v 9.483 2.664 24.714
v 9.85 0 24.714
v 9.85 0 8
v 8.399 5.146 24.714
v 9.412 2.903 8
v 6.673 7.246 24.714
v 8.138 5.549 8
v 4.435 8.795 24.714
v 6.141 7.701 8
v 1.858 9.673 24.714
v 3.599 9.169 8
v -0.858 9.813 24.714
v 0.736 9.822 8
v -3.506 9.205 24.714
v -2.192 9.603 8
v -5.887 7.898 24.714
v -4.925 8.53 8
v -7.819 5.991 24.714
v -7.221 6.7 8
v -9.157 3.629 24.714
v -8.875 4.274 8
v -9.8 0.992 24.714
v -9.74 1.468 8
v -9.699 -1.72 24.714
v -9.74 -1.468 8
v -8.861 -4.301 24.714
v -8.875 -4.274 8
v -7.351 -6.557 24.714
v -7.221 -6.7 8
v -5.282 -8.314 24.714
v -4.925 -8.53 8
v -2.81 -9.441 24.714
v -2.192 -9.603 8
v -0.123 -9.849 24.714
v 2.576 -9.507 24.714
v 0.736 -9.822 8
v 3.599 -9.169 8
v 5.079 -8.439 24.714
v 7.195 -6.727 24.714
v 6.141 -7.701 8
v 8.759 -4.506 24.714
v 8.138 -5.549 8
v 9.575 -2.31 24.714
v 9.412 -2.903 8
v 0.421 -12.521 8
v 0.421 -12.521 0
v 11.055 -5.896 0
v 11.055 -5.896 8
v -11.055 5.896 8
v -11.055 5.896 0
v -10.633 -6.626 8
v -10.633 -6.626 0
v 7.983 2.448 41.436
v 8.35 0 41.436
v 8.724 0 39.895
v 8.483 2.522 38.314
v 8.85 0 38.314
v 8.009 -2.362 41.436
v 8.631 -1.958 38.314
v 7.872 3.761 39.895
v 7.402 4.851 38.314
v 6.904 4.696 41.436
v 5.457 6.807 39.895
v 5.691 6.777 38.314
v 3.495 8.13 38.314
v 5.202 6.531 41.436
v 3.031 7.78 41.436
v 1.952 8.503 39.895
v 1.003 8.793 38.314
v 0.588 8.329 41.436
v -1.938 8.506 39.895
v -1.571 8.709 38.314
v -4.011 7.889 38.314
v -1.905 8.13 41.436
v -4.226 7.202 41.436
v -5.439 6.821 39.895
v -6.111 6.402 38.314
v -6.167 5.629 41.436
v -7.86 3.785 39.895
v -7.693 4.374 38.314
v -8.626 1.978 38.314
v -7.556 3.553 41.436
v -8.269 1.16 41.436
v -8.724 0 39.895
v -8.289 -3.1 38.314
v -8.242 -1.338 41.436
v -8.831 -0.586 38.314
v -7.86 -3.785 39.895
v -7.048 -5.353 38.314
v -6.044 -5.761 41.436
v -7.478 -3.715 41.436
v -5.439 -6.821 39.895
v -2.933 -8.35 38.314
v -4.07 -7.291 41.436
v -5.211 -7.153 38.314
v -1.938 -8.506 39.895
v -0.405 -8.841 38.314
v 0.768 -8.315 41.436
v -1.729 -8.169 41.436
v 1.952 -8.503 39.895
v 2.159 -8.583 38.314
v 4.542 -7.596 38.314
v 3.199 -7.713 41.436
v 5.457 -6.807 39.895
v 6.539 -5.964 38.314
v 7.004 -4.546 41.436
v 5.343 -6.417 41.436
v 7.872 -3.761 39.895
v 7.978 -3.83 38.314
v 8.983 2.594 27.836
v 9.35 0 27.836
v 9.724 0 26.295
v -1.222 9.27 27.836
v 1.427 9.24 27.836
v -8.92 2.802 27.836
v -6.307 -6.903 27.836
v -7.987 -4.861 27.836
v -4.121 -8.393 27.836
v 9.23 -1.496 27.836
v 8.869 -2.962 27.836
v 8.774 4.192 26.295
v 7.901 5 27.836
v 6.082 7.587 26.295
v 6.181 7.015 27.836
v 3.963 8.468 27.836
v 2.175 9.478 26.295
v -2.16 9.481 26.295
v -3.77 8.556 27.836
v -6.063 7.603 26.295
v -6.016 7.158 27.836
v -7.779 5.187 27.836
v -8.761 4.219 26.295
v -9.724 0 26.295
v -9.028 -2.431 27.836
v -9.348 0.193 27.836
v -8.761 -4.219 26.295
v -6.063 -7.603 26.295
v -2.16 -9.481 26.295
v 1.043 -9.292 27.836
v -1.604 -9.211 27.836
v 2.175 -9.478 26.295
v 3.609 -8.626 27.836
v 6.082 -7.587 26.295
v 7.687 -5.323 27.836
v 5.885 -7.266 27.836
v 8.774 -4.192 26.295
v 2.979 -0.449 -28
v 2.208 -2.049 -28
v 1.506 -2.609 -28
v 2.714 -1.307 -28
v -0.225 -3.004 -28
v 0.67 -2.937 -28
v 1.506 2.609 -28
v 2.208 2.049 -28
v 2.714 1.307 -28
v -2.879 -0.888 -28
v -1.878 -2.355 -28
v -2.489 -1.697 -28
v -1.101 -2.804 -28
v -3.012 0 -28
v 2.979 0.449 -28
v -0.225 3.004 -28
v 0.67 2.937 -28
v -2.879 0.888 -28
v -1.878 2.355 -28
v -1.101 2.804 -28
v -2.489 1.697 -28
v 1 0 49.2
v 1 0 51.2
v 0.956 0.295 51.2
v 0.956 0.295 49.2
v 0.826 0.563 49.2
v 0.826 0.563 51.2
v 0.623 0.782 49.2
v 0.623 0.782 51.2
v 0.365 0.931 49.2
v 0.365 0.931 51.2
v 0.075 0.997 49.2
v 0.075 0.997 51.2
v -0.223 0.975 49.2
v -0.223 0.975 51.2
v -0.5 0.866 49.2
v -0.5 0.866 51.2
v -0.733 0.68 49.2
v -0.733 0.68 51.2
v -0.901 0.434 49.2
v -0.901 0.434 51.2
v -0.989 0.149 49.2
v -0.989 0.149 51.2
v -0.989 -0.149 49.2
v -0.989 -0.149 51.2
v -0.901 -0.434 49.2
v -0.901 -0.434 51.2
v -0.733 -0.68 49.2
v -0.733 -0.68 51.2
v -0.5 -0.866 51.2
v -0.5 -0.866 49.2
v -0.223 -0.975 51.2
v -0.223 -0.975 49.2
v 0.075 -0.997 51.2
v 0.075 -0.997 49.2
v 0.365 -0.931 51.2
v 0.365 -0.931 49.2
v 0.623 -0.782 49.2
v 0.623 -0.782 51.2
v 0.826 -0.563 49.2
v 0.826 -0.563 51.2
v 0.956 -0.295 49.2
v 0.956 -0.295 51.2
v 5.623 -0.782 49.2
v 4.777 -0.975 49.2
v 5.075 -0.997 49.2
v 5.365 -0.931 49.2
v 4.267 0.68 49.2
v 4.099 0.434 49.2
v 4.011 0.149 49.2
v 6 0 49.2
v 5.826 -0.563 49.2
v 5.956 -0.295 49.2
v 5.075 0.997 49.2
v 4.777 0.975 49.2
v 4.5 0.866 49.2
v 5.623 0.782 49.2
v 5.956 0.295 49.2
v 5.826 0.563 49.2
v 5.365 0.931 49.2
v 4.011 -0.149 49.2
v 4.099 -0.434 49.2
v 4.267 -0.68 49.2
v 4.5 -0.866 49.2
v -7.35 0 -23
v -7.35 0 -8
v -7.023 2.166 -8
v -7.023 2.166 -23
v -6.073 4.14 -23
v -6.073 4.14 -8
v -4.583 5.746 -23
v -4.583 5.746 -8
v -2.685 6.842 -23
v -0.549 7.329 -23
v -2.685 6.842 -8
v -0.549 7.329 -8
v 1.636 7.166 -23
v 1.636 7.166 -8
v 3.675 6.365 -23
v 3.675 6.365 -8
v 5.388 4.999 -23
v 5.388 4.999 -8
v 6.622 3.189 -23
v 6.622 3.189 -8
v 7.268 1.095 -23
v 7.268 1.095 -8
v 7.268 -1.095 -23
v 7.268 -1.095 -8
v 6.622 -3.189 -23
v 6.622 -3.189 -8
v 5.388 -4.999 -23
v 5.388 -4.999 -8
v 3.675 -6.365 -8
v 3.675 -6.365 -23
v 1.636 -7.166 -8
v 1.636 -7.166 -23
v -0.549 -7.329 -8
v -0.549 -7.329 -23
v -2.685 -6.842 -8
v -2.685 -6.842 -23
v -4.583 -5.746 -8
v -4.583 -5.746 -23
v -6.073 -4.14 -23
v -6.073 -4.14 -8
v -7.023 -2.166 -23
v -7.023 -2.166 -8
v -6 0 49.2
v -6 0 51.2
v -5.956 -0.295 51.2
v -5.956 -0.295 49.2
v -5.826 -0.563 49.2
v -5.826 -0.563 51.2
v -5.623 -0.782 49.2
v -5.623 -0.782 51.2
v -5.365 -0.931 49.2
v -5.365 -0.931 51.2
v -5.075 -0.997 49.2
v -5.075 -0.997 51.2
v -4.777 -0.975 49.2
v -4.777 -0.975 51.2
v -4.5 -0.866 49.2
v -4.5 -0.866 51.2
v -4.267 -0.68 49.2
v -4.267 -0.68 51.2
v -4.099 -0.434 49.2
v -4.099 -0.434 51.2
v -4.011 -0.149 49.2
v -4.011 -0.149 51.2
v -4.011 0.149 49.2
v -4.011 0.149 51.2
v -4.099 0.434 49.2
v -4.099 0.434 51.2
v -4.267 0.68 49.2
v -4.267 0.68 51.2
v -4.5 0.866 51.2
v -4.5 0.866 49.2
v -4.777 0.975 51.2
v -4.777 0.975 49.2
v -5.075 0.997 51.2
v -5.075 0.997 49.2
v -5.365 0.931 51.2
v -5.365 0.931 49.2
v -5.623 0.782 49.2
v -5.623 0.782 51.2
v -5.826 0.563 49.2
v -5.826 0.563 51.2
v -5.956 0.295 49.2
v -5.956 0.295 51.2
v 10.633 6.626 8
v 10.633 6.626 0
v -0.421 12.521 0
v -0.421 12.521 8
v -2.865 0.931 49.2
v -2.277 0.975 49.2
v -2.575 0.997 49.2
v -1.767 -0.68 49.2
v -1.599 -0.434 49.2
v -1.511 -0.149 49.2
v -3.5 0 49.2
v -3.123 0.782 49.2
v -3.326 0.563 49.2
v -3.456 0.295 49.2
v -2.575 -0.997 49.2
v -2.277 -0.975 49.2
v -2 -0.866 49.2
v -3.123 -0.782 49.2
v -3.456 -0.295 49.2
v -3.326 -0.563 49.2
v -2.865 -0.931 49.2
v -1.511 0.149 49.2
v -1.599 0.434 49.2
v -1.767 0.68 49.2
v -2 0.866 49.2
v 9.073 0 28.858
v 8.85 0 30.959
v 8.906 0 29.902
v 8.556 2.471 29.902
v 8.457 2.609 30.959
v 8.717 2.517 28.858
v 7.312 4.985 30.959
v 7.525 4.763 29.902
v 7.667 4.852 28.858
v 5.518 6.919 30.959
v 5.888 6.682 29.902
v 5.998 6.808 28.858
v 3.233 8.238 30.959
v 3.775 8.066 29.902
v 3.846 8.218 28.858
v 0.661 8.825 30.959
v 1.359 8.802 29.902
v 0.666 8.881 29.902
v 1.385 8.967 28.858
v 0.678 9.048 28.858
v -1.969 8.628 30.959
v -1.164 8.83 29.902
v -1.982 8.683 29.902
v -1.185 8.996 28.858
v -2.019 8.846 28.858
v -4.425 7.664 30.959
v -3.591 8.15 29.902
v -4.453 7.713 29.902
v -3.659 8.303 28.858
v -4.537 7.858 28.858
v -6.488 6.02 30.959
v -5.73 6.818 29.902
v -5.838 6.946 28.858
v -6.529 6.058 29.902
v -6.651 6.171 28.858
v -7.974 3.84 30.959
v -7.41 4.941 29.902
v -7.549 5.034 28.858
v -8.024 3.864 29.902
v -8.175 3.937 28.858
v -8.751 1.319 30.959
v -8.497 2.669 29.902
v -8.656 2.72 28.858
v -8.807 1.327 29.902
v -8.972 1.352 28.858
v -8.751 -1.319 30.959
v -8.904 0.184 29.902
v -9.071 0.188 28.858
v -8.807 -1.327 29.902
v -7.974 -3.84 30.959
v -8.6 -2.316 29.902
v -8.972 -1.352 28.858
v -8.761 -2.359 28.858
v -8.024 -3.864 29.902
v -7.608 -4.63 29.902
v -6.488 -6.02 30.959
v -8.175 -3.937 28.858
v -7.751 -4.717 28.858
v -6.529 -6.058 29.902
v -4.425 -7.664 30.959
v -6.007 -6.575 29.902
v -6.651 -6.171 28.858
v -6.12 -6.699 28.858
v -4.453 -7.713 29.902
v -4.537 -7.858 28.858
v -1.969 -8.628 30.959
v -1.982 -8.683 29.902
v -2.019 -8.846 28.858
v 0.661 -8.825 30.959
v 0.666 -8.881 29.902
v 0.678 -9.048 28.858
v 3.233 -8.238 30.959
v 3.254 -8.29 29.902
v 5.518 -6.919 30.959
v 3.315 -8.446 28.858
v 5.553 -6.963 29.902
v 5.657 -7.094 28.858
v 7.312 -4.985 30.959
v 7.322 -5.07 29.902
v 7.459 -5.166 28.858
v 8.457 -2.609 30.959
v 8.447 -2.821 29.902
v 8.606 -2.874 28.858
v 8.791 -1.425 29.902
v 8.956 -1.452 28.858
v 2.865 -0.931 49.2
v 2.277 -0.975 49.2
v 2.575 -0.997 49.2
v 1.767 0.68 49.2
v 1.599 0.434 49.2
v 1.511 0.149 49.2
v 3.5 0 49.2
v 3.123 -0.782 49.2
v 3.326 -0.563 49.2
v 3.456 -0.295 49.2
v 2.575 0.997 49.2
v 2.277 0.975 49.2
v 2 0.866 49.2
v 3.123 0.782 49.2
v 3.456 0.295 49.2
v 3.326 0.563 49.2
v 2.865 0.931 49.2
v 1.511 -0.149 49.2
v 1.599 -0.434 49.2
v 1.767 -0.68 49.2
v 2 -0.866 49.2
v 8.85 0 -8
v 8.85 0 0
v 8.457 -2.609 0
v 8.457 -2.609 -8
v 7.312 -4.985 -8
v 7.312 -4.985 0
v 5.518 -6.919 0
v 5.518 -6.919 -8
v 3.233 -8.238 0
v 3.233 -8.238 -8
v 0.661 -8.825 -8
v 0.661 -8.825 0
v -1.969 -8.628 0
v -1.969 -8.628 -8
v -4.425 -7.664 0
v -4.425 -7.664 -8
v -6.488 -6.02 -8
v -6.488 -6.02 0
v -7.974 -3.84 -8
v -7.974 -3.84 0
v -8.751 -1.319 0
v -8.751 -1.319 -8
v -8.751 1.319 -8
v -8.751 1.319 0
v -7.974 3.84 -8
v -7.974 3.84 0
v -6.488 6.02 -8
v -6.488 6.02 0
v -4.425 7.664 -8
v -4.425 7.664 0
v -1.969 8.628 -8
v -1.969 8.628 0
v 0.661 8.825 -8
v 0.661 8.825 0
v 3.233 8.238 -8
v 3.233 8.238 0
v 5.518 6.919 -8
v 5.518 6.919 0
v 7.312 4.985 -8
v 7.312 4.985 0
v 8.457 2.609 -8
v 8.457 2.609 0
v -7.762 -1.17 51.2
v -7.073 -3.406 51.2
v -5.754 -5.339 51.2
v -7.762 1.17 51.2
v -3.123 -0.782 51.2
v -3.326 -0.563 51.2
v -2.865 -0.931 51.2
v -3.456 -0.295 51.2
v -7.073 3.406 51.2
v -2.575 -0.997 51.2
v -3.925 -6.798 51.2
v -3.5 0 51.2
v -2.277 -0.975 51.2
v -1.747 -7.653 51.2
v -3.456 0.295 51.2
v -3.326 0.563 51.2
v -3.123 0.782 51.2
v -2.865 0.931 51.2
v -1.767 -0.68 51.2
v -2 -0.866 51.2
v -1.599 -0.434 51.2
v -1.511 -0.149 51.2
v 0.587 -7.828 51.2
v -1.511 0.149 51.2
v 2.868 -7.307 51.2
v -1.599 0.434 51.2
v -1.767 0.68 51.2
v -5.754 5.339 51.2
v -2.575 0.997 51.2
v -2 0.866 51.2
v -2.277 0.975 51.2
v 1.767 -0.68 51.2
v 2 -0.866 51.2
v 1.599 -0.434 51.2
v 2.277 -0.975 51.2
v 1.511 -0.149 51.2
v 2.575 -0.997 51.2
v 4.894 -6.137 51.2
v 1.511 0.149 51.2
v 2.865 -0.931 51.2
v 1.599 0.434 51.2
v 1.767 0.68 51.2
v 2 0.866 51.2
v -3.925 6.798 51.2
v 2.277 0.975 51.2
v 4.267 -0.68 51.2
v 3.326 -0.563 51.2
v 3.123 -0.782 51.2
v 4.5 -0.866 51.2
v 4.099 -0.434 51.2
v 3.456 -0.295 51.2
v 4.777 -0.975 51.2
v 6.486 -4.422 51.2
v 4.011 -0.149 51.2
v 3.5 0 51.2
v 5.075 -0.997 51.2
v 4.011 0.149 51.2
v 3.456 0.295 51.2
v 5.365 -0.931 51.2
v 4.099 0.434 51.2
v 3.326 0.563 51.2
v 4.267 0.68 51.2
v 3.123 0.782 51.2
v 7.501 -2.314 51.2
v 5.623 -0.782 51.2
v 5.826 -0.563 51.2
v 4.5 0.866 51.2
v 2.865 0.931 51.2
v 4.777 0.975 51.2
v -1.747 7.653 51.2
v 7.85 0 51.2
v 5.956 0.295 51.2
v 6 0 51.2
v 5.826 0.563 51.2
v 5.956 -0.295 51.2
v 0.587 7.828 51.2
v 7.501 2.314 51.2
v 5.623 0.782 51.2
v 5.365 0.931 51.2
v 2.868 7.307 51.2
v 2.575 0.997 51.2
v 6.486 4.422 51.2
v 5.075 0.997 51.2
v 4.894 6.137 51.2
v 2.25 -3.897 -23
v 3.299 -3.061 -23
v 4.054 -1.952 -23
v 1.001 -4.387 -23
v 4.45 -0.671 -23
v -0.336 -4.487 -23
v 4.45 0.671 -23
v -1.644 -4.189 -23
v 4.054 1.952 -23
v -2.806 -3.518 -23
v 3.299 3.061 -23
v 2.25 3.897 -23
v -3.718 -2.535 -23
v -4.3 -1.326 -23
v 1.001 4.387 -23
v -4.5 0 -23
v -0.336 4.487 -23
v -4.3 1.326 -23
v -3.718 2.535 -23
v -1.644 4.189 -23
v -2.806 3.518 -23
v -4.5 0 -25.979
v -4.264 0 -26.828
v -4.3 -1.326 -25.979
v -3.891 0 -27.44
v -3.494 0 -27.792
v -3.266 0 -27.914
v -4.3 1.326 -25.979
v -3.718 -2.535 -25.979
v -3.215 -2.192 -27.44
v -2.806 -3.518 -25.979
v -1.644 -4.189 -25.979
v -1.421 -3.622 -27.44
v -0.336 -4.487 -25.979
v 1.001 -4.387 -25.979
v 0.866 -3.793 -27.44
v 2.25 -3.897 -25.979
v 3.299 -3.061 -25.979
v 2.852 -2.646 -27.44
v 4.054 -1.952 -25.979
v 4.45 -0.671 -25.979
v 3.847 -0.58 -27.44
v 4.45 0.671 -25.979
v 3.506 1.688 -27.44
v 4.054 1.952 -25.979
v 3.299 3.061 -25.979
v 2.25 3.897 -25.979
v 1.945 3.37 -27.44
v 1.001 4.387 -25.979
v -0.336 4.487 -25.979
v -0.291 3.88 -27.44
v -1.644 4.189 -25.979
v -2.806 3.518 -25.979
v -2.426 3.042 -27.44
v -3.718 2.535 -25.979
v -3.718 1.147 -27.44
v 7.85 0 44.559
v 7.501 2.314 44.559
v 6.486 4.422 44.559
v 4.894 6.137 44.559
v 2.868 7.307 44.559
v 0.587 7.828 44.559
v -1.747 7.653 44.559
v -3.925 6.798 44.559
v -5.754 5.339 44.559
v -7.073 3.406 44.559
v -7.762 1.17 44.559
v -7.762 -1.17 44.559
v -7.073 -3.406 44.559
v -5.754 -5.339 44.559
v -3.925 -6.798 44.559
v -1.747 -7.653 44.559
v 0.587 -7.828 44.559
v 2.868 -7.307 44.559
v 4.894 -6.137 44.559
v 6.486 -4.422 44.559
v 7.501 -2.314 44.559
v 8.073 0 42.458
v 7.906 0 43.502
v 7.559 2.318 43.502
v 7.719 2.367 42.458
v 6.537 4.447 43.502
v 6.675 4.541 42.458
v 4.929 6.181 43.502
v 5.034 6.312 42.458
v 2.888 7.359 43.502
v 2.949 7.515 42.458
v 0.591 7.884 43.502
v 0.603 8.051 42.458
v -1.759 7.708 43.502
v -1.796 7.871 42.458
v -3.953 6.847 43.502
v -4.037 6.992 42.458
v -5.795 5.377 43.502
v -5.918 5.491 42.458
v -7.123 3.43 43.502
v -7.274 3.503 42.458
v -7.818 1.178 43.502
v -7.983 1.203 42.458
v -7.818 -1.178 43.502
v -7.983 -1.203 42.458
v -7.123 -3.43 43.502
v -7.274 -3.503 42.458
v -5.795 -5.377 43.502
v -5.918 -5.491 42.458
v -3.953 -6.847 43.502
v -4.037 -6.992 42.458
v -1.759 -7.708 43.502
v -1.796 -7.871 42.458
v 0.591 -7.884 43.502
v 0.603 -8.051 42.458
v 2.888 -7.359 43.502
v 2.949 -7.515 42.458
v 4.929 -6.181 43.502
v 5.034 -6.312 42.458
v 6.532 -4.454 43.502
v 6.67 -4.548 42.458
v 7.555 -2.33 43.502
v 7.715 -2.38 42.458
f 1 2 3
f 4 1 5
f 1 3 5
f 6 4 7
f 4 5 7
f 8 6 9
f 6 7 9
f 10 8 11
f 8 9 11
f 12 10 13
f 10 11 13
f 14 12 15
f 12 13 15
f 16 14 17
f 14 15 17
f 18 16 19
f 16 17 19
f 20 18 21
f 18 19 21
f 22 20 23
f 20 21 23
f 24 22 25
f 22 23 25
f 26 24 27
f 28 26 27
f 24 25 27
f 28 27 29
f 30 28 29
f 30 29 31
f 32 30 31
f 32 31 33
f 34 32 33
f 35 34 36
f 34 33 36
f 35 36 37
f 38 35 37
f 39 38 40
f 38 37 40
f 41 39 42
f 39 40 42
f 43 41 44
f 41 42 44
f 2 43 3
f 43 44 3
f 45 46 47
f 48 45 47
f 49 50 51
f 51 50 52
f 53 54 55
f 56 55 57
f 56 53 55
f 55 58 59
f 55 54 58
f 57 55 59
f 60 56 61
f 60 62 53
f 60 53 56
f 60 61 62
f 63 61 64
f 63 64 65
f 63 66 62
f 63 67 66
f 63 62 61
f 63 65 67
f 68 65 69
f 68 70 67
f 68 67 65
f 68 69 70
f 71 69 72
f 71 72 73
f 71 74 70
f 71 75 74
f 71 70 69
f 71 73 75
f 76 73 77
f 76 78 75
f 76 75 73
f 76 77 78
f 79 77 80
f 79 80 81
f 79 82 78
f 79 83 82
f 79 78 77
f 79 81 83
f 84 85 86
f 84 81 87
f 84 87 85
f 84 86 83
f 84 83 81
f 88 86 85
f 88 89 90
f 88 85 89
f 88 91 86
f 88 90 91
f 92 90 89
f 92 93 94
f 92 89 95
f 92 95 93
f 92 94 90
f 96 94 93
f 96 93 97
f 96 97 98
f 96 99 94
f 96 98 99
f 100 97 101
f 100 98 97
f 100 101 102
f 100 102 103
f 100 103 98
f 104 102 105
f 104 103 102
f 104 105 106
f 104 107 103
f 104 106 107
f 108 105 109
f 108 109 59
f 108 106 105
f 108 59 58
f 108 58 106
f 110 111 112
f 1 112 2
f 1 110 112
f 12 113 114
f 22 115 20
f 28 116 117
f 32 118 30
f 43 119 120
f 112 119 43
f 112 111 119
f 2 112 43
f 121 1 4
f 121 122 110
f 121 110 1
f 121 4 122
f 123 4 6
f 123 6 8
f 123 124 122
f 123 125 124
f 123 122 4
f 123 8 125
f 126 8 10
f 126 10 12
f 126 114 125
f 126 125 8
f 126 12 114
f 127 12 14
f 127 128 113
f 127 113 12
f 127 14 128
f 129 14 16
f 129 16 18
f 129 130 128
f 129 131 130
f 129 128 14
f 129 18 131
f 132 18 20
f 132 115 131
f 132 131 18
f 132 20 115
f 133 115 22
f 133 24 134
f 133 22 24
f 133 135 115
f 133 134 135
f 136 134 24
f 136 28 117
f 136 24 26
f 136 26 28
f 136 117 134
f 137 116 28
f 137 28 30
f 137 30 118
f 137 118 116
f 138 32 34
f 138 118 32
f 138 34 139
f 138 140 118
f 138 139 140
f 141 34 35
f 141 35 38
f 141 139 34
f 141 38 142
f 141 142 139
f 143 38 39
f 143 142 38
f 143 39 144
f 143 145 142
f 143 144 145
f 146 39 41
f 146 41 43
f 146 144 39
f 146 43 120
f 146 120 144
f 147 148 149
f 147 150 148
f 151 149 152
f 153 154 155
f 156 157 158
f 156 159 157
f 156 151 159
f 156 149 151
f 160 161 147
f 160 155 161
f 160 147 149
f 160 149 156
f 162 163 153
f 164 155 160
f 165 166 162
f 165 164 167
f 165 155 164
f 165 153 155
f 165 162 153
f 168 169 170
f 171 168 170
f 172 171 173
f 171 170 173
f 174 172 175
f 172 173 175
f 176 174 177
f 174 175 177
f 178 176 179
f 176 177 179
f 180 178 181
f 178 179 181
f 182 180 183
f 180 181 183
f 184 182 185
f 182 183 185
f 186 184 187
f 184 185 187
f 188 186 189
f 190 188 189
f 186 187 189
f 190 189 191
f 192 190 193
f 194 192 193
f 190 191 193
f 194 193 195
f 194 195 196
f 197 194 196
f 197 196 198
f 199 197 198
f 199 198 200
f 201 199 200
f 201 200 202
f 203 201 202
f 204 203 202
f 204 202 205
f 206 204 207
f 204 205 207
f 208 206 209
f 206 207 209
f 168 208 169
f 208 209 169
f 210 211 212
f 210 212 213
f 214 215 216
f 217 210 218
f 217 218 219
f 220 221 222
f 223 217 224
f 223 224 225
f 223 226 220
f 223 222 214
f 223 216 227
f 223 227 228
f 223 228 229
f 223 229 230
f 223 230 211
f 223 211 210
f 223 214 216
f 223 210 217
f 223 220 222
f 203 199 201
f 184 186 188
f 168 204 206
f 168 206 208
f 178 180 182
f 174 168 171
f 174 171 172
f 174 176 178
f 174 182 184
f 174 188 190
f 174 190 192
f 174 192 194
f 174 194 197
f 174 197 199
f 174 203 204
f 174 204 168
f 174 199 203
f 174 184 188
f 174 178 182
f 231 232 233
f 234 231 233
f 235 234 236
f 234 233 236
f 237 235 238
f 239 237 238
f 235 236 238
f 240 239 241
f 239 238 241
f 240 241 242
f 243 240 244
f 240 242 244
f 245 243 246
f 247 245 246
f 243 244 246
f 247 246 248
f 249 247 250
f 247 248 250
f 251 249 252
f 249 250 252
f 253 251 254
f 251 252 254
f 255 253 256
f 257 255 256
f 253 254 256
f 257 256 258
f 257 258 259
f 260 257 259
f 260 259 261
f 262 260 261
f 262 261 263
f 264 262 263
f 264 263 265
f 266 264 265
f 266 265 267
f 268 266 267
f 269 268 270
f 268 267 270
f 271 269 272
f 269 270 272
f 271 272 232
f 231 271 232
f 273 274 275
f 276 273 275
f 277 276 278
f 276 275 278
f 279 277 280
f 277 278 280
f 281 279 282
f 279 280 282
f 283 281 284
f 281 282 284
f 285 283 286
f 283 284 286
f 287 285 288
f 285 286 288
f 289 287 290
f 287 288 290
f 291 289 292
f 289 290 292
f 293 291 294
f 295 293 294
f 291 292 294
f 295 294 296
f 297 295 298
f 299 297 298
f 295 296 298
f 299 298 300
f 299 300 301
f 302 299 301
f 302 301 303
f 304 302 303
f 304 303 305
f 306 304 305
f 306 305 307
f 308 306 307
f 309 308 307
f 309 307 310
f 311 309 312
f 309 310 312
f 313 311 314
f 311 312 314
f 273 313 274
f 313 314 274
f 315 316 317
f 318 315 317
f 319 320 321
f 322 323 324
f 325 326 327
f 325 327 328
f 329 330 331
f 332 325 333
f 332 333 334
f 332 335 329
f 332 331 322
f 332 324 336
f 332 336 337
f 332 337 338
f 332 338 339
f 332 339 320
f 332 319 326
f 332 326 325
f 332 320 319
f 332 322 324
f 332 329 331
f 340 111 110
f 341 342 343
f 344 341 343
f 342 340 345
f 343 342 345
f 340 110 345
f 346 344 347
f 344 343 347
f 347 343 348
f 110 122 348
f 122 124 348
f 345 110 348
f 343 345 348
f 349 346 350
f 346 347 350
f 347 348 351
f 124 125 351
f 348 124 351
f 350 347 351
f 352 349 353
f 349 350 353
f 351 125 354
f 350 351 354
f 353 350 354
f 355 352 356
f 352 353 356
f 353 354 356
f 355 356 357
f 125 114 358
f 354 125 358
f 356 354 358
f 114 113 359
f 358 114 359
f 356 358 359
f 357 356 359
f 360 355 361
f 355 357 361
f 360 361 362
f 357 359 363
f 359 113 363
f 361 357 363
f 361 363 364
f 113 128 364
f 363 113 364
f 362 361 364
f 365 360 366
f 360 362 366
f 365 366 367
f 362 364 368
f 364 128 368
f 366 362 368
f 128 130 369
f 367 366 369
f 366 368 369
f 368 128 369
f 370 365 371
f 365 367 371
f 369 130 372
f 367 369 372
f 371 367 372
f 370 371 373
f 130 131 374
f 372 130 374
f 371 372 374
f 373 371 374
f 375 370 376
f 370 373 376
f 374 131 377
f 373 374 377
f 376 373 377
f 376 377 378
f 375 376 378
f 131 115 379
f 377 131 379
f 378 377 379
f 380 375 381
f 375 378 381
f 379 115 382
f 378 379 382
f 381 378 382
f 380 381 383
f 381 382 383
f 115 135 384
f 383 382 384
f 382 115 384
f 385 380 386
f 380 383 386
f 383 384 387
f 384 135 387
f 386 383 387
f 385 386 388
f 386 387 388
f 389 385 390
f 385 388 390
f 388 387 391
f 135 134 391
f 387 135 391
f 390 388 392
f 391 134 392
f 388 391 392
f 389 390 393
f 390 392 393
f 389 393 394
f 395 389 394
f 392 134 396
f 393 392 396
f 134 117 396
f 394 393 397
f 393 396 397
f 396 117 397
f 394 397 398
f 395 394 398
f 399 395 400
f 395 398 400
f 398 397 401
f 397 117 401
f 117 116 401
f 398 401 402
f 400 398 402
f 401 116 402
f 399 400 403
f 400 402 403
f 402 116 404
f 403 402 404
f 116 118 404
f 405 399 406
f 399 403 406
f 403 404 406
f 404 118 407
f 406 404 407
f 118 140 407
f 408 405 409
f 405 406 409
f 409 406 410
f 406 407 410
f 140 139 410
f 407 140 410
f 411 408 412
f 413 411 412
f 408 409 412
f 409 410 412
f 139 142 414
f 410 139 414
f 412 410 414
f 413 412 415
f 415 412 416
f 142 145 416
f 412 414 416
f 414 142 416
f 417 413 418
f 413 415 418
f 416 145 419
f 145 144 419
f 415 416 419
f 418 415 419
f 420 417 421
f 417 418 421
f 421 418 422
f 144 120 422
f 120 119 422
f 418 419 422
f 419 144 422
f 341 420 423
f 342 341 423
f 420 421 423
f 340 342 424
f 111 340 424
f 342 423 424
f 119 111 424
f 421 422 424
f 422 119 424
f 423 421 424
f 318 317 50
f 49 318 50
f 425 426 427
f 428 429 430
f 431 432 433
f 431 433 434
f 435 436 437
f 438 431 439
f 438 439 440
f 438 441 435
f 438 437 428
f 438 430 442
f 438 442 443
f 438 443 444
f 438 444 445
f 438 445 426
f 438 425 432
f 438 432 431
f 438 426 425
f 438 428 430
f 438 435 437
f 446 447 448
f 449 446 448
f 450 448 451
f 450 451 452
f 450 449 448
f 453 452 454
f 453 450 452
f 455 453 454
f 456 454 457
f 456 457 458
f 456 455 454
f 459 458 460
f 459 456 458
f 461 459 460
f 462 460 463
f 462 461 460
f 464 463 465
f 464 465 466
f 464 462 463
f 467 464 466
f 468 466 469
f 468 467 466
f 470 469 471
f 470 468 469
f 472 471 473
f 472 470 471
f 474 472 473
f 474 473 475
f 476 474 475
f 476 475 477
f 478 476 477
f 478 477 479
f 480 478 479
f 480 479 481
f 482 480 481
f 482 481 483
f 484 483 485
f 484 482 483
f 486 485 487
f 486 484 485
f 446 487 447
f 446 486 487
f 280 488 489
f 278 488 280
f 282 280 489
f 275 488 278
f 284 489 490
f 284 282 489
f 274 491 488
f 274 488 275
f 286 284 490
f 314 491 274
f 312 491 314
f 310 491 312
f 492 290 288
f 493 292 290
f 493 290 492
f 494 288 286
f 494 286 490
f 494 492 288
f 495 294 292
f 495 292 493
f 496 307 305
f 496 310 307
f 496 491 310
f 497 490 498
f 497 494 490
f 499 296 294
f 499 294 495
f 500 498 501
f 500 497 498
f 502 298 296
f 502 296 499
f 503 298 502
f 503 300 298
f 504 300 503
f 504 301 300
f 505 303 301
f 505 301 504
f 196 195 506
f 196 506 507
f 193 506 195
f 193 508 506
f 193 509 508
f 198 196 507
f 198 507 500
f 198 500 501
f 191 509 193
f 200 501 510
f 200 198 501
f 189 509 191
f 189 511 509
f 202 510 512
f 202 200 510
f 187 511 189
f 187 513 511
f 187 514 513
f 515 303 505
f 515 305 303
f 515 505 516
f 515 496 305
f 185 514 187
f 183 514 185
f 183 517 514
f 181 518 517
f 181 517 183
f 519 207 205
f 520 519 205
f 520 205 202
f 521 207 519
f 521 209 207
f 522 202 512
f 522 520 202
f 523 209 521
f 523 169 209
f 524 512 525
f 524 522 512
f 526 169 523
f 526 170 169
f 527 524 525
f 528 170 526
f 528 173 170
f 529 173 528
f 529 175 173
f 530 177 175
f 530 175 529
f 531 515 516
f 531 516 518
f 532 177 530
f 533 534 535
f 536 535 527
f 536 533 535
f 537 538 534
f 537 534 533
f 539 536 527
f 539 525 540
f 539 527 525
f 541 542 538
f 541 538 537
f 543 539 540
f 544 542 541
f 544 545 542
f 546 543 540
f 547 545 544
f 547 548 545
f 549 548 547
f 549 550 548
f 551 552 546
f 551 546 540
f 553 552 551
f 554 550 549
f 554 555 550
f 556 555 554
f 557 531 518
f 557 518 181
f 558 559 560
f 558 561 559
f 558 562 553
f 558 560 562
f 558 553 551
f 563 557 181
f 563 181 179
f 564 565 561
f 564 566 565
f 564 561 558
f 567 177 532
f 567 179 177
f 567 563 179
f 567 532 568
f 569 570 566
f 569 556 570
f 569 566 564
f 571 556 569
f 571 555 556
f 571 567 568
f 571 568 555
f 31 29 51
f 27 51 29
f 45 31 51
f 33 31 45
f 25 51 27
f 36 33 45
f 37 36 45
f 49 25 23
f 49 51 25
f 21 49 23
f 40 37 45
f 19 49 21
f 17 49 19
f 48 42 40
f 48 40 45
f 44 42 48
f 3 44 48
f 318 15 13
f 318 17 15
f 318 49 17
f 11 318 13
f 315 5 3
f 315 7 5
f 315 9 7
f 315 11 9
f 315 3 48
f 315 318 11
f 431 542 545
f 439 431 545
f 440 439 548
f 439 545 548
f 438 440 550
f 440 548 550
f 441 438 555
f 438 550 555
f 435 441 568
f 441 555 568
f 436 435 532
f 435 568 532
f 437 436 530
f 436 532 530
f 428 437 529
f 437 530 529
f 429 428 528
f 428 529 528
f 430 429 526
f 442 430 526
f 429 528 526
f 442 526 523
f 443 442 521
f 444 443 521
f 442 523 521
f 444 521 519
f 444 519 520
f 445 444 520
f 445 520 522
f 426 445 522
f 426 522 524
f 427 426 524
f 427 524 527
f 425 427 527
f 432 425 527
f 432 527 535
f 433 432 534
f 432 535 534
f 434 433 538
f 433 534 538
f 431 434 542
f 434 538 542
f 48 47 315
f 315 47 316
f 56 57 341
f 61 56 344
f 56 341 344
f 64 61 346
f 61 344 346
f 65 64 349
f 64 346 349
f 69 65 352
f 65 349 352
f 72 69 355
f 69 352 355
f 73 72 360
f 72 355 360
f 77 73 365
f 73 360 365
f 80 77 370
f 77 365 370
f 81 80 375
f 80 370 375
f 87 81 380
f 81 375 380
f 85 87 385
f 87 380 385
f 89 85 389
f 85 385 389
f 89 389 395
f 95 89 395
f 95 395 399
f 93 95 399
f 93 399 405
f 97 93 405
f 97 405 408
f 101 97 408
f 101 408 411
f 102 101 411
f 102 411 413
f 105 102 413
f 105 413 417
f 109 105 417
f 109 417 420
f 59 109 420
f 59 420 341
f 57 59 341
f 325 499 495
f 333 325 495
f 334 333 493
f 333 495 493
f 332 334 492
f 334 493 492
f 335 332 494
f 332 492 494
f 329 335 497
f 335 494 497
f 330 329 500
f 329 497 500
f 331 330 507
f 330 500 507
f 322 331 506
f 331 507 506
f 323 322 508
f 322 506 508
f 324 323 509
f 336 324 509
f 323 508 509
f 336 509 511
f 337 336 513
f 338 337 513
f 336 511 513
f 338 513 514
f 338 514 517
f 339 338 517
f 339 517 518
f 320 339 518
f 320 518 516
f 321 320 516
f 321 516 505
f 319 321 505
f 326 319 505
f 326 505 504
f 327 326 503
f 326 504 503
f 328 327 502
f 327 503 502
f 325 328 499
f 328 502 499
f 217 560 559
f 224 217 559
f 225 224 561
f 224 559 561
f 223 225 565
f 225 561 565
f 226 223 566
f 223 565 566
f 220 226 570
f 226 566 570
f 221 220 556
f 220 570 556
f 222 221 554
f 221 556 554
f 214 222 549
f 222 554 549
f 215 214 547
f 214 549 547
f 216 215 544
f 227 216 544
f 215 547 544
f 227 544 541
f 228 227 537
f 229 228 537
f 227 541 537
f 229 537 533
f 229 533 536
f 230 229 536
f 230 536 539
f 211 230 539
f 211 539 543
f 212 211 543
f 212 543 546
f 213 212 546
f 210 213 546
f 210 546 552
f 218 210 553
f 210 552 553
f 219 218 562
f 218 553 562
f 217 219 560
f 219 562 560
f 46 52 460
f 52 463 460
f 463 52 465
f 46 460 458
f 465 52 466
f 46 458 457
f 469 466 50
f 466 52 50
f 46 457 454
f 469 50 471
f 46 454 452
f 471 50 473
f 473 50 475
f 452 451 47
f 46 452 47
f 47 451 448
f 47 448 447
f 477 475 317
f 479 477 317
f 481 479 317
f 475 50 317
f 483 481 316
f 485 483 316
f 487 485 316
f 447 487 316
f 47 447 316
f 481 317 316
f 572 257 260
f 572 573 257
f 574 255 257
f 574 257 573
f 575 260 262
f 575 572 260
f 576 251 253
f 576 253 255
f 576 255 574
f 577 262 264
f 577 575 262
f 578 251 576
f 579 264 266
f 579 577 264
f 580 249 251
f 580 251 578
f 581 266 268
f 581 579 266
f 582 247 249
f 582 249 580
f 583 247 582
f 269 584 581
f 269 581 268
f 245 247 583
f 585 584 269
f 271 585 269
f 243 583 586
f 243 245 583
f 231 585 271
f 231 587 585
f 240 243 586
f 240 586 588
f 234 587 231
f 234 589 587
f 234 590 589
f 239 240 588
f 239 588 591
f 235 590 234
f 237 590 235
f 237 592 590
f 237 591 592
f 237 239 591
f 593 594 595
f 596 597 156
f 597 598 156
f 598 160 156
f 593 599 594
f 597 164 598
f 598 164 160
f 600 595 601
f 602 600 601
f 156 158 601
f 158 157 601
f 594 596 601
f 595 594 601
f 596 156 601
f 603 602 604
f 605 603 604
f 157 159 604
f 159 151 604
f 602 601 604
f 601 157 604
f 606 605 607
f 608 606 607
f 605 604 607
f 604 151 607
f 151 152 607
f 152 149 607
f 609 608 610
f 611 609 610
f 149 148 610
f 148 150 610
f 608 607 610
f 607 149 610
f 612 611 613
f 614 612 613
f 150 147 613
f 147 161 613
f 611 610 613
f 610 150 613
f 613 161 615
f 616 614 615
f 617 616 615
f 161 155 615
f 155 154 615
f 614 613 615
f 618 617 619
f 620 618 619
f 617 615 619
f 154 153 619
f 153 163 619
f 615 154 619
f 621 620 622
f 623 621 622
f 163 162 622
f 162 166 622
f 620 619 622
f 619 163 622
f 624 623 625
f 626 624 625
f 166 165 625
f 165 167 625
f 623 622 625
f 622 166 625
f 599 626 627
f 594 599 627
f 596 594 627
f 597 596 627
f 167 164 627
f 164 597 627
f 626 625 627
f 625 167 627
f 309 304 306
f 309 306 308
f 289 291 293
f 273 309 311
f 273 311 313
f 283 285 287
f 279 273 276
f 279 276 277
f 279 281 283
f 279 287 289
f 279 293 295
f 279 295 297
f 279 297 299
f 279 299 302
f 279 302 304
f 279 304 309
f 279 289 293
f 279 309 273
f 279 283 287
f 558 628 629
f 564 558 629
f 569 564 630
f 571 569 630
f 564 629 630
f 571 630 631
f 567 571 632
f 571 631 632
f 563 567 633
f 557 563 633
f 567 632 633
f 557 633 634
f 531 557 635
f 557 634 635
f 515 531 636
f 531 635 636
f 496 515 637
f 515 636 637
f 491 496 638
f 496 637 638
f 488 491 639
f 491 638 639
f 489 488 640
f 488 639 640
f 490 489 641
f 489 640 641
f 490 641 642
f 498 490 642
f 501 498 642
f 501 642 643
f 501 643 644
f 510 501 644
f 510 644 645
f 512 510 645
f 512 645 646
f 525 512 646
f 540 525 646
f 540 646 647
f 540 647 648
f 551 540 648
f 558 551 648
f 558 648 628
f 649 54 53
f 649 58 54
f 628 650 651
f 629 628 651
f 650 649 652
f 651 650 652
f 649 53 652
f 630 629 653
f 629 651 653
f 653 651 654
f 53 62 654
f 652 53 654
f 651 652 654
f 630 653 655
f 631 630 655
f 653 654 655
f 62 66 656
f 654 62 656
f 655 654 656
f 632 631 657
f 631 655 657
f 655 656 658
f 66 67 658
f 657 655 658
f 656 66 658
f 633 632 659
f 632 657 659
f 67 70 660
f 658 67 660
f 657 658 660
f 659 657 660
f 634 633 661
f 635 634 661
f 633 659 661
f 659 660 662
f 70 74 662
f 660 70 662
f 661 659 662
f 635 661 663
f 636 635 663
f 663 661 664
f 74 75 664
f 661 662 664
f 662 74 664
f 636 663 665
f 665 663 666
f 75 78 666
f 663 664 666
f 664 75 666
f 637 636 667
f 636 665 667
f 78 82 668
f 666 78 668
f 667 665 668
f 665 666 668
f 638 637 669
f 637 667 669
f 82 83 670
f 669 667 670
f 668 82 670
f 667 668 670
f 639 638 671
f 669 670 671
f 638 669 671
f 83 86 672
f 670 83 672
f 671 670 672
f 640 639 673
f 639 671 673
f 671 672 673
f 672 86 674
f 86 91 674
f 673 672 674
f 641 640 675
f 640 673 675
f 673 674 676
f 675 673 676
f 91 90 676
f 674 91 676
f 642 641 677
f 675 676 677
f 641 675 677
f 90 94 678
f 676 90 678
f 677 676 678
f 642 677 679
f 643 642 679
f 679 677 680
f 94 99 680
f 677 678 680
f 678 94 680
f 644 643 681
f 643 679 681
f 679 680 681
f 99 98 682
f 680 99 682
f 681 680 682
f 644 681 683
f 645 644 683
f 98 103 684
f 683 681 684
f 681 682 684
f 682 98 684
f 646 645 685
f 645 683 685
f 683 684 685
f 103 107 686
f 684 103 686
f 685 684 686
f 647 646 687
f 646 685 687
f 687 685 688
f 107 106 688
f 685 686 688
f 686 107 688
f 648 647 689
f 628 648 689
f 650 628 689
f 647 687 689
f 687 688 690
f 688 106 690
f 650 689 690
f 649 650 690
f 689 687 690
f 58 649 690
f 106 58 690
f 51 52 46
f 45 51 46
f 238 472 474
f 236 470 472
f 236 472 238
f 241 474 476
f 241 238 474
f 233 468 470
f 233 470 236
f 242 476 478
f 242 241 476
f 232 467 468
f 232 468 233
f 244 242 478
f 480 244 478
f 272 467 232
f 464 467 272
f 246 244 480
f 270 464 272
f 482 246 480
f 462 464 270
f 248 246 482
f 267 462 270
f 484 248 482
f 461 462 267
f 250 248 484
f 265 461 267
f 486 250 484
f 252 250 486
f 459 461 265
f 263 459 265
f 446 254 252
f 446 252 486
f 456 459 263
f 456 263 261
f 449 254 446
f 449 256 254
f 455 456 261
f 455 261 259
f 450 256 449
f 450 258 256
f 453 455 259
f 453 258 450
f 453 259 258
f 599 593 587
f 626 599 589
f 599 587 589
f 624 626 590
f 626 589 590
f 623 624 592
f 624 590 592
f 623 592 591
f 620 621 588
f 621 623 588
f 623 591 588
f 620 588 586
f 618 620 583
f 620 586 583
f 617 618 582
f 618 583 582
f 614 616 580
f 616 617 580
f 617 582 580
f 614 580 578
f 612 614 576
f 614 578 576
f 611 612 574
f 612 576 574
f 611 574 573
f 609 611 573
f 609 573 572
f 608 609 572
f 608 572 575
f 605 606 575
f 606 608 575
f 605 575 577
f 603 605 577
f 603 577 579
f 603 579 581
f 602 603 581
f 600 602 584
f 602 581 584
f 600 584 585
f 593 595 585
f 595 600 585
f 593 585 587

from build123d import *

# Parameters (mm, degrees)
EXTRUDE_1_DEPTH     = 8
SKETCH_2_R          = 9.85
EXTRUDE_2_DEPTH     = 18.6
SKETCH_3_R          = 8.85
EXTRUDE_3_DEPTH     = 13.6
SKETCH_4_R          = 7.85
EXTRUDE_4_DEPTH     = 11
EXTRUDE_START       = 8
SKETCH_8_R          = 8.85
EXTRUDE_7_DEPTH     = 8
SKETCH_9_R          = 7.35
EXTRUDE_8_DEPTH     = 15
SKETCH_10_R         = 4.5
EXTRUDE_9_DEPTH     = 5
FILLET_1_R          = 10
FILLET_2_R          = 10
FILLET_3_R          = 10
FILLET_4_R          = 10
SKETCH_12_R         = 1
CUT_EXTRUDE_1_DEPTH = 2


with BuildPart() as part:
    # ｽｹｯﾁ1 → ﾎﾞｽ - 押し出し1 (new body)
    with BuildSketch(Plane.XY):
        Polygon((11.05453339, -5.895814181), (10.633191552, 6.625599652), (-0.421341838, 12.521413833), (-11.05453339, 5.895814181), (-10.633191552, -6.625599652), (0.421341838, -12.521413833), align=None)
    extrude(amount=EXTRUDE_1_DEPTH)

    # ｽｹｯﾁ2 → ﾎﾞｽ - 押し出し2 (add)
    with BuildSketch(Plane.XY.offset(8)):
        Circle(SKETCH_2_R)
    extrude(amount=EXTRUDE_2_DEPTH)

    # ｽｹｯﾁ3 → ﾎﾞｽ - 押し出し3 (add)
    with BuildSketch(Plane.XY.offset(26.6)):
        Circle(SKETCH_3_R)
    extrude(amount=EXTRUDE_3_DEPTH)

    # ｽｹｯﾁ4 → ﾎﾞｽ - 押し出し4 (add)
    with BuildSketch(Plane.XY.offset(40.2)):
        Circle(SKETCH_4_R)
    extrude(amount=EXTRUDE_4_DEPTH)

    # ｽｹｯﾁ8 → ﾎﾞｽ - 押し出し7 (add)
    with BuildSketch(Plane(origin=(0, 0, 0), x_dir=(-1, 0, 0), z_dir=(0, 0, -1)).offset(EXTRUDE_START)):
        with Locations(Location((0, 0, 0), (0, 0, 180))):
            Circle(SKETCH_8_R)
    extrude(amount=-EXTRUDE_7_DEPTH)

    # ｽｹｯﾁ9 → ﾎﾞｽ - 押し出し8 (add)
    with BuildSketch(Plane(origin=(0, 0, -8), x_dir=(-1, 0, 0), z_dir=(0, 0, -1))):
        Circle(SKETCH_9_R)
    extrude(amount=EXTRUDE_8_DEPTH)

    # ｽｹｯﾁ10 → ﾎﾞｽ - 押し出し9 (add)
    with BuildSketch(Plane(origin=(0, 0, -23), x_dir=(-1, 0, 0), z_dir=(0, 0, -1))):
        Circle(SKETCH_10_R)
    extrude(amount=EXTRUDE_9_DEPTH)

    # ﾌｨﾚｯﾄ1
    # the kernel refuses this fillet: 10 mm, written as the material it adds along each edge
    with BuildSketch(Plane(origin=(0, 0, 26.6), x_dir=(1, 0, 0), z_dir=(0, -1, 0))) as fillet_1_piece_1:
        with BuildLine():
            CenterArc((18.85, 4.358898944), FILLET_1_R, 180, 25.841932763)
            Line((8.85, 4.358898944), (8.65, 4.358898944))
            Line((8.65, 4.358898944), (8.65, 0))
            Line((8.65, 0), (8.85, -0.2))
            ThreePointArc((8.85, -0.2), (9.35, -0.2), (9.67, -0.087177979))
            Line((9.67, -0.087177979), (9.85, 0))
        make_face()
    revolve(axis=Axis((0, 0, 26.6), (0, 0, 1)))

    # ﾌｨﾚｯﾄ2
    fillet_2_edges = [part.edges().sort_by_distance(p)[0] for p in [
        (-9.85, 0, 26.6),
    ]]
    fillet(fillet_2_edges, radius=FILLET_2_R)

    # ﾌｨﾚｯﾄ3
    # the kernel refuses this fillet: 10 mm, written as the material it adds along each edge
    with BuildSketch(Plane(origin=(0, 0, 40.2), x_dir=(1, 0, 0), z_dir=(0, -1, 0))) as fillet_3_piece_1:
        with BuildLine():
            CenterArc((17.85, 4.358898944), FILLET_3_R, 180, 25.841932763)
            Line((7.85, 4.358898944), (7.65, 4.358898944))
            Line((7.65, 4.358898944), (7.65, 0))
            Line((7.65, 0), (7.85, -0.2))
            ThreePointArc((7.85, -0.2), (8.35, -0.2), (8.67, -0.087177979))
            Line((8.67, -0.087177979), (8.85, 0))
        make_face()
    revolve(axis=Axis((0, 0, 40.2), (0, 0, 1)))

    # ﾌｨﾚｯﾄ4
    fillet_4_edges = [part.edges().sort_by_distance(p)[0] for p in [
        (-8.85, 0, 40.2),
    ]]
    fillet(fillet_4_edges, radius=FILLET_4_R)

    # ｽｹｯﾁ11 → ｶｯﾄ - 回転1 (revolve, cut)
    with BuildSketch(Plane(origin=(0, 0, 0), x_dir=(0, 0, -1), z_dir=(1, 0, 0)), mode=Mode.PRIVATE) as cut_revolve_1_sk:
        with BuildLine():
            Line((25.979017437, 4.5), (28, 4.5))
            Line((28, 4.5), (28, 3.012412215))
            add(Edge.make_bspline(
                [(25.979017437, 4.5), (26.824177567, 4.378307252), (27.771962705, 3.927947166), (28, 3.012412215)],
                knots=[0, 0, 0, 0, 1, 1, 1, 1], degree=3))
        make_face()
    revolve(cut_revolve_1_sk.sketch.rotate(Axis((0, 0, -28), (0, 0, 1)), 90), axis=Axis((0, 0, -28), (0, 0, 1)), mode=Mode.SUBTRACT)

    # ｽｹｯﾁ12 → ｶｯﾄ - 押し出し1 (cut)
    with BuildSketch(Plane.XY.offset(51.2)):
        Circle(SKETCH_12_R)
        with Locations((2.5, 0)):
            Circle(SKETCH_12_R)
        with Locations((5, 0)):
            Circle(SKETCH_12_R)
        with Locations(Location((-5, 0, 0), (0, 0, 180))):
            Circle(SKETCH_12_R)
        with Locations(Location((-2.5, 0, 0), (0, 0, 180))):
            Circle(SKETCH_12_R)
    extrude(amount=-CUT_EXTRUDE_1_DEPTH, mode=Mode.SUBTRACT)


solid = part.part
